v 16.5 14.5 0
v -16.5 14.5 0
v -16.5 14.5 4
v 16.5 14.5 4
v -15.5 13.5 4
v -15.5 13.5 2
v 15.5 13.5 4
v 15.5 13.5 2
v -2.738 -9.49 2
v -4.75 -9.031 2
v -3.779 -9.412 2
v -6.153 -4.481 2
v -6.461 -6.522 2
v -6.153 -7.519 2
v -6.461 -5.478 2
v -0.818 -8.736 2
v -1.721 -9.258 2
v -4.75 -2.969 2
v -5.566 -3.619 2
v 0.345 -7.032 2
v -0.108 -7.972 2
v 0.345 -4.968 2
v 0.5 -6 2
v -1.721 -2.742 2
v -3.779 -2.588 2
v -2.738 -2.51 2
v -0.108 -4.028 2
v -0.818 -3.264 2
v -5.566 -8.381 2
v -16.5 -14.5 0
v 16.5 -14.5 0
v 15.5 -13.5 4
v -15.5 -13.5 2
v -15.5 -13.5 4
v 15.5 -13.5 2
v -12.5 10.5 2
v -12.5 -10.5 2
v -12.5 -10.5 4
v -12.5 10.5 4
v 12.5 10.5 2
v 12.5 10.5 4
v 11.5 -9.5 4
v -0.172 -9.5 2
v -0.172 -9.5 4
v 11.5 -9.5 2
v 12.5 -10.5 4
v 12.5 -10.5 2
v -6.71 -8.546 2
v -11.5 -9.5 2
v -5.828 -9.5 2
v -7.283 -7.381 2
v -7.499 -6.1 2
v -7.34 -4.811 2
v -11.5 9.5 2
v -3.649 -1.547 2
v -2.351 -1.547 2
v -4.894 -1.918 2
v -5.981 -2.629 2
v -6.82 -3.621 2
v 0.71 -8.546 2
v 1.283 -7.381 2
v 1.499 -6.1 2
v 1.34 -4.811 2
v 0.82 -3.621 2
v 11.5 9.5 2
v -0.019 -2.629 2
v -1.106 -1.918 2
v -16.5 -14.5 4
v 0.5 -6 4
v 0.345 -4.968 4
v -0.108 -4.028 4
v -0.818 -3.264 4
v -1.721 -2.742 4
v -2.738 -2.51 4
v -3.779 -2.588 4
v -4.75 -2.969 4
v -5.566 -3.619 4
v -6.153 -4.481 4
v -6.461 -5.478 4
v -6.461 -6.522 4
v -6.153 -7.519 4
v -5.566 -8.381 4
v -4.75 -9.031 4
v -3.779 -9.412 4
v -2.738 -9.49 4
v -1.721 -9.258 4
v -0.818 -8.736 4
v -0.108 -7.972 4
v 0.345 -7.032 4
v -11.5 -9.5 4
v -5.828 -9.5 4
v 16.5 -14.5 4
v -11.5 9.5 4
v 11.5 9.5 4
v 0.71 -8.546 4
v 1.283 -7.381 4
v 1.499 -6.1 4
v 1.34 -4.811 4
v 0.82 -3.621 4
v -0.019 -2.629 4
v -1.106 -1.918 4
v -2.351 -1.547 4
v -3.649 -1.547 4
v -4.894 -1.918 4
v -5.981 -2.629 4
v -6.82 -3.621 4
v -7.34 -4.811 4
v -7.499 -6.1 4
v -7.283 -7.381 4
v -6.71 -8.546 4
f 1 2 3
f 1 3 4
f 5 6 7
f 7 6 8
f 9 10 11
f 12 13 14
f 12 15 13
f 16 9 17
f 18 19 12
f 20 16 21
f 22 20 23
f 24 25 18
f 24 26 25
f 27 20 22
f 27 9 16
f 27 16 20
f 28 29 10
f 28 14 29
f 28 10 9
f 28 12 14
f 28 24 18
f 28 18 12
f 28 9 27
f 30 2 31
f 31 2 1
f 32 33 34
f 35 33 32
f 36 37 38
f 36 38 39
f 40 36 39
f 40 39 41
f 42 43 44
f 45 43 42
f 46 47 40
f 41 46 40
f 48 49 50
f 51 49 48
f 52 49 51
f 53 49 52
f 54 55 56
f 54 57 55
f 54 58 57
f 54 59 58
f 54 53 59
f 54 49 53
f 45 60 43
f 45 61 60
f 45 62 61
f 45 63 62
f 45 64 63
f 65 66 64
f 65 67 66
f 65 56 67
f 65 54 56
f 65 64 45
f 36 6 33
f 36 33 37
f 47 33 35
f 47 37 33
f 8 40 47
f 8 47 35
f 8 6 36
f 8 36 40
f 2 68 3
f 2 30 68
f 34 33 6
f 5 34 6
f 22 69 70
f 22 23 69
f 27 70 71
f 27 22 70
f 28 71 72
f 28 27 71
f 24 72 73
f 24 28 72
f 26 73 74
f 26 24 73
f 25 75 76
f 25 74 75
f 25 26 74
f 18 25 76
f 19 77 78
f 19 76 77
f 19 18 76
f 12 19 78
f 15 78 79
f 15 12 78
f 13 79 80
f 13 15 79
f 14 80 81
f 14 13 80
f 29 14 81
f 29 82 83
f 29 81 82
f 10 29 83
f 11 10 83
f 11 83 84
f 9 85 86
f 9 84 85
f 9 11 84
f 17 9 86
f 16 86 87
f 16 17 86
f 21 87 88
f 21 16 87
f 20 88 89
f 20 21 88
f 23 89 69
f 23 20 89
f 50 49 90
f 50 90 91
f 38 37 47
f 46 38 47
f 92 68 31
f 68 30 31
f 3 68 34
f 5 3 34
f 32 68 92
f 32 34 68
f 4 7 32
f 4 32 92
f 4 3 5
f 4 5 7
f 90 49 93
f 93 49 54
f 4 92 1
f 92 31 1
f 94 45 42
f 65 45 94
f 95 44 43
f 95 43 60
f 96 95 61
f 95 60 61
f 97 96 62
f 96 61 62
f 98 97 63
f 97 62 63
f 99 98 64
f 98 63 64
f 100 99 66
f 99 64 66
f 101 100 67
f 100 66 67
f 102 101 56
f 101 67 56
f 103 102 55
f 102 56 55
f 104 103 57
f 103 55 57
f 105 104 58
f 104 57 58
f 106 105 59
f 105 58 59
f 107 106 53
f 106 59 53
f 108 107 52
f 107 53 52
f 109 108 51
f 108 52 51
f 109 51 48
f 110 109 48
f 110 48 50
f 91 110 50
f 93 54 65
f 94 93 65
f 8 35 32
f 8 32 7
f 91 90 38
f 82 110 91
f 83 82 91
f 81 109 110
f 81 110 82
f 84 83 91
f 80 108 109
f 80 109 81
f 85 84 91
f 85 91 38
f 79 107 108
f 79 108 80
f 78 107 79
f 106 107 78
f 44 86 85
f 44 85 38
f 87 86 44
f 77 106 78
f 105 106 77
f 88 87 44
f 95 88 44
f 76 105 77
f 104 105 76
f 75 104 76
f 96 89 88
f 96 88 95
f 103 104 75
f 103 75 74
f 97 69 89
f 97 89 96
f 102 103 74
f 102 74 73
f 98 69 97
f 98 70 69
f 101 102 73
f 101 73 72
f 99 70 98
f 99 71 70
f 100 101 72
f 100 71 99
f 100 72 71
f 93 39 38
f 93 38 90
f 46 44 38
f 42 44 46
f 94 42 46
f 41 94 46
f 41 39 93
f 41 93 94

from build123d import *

# Parameters (mm, degrees)
F0_W     = 33
F0_H     = 29
F1_DEPTH = 2
F2_W     = 33
F2_H     = 29
F2_W_2   = 31
F2_H_2   = 27
F3_DEPTH = 2
F4_W     = 25
F4_H     = 21
F4_W_2   = 23
F4_H_2   = 19
F5_DEPTH = 2
F6_R     = 4.5
F6_R_2   = 3.5
F7_DEPTH = 2


with BuildPart() as f1:
    # F0 (on Top) → F1 (new body)
    with BuildSketch(Plane.XY):
        Rectangle(F0_W, F0_H)
    extrude(amount=F1_DEPTH)

    # F2 (on face) → F3 (join)
    with BuildSketch(Plane.XY.offset(2)):
        Rectangle(F2_W, F2_H)
        Rectangle(F2_W_2, F2_H_2, mode=Mode.SUBTRACT)
    extrude(amount=F3_DEPTH)

    # F4 (on face) → F5 (join)
    with BuildSketch(Plane.XY.offset(2)):
        Rectangle(F4_W, F4_H)
        Rectangle(F4_W_2, F4_H_2, mode=Mode.SUBTRACT)
    extrude(amount=F5_DEPTH)

    # F6 (on face) → F7 (join)
    with BuildSketch(Plane.XY.offset(2)):
        with Locations((-3, -6)):
            Circle(F6_R)
        with Locations((-3, -6)):
            Circle(F6_R_2, mode=Mode.SUBTRACT)
    extrude(amount=F7_DEPTH)


solid = f1.part
